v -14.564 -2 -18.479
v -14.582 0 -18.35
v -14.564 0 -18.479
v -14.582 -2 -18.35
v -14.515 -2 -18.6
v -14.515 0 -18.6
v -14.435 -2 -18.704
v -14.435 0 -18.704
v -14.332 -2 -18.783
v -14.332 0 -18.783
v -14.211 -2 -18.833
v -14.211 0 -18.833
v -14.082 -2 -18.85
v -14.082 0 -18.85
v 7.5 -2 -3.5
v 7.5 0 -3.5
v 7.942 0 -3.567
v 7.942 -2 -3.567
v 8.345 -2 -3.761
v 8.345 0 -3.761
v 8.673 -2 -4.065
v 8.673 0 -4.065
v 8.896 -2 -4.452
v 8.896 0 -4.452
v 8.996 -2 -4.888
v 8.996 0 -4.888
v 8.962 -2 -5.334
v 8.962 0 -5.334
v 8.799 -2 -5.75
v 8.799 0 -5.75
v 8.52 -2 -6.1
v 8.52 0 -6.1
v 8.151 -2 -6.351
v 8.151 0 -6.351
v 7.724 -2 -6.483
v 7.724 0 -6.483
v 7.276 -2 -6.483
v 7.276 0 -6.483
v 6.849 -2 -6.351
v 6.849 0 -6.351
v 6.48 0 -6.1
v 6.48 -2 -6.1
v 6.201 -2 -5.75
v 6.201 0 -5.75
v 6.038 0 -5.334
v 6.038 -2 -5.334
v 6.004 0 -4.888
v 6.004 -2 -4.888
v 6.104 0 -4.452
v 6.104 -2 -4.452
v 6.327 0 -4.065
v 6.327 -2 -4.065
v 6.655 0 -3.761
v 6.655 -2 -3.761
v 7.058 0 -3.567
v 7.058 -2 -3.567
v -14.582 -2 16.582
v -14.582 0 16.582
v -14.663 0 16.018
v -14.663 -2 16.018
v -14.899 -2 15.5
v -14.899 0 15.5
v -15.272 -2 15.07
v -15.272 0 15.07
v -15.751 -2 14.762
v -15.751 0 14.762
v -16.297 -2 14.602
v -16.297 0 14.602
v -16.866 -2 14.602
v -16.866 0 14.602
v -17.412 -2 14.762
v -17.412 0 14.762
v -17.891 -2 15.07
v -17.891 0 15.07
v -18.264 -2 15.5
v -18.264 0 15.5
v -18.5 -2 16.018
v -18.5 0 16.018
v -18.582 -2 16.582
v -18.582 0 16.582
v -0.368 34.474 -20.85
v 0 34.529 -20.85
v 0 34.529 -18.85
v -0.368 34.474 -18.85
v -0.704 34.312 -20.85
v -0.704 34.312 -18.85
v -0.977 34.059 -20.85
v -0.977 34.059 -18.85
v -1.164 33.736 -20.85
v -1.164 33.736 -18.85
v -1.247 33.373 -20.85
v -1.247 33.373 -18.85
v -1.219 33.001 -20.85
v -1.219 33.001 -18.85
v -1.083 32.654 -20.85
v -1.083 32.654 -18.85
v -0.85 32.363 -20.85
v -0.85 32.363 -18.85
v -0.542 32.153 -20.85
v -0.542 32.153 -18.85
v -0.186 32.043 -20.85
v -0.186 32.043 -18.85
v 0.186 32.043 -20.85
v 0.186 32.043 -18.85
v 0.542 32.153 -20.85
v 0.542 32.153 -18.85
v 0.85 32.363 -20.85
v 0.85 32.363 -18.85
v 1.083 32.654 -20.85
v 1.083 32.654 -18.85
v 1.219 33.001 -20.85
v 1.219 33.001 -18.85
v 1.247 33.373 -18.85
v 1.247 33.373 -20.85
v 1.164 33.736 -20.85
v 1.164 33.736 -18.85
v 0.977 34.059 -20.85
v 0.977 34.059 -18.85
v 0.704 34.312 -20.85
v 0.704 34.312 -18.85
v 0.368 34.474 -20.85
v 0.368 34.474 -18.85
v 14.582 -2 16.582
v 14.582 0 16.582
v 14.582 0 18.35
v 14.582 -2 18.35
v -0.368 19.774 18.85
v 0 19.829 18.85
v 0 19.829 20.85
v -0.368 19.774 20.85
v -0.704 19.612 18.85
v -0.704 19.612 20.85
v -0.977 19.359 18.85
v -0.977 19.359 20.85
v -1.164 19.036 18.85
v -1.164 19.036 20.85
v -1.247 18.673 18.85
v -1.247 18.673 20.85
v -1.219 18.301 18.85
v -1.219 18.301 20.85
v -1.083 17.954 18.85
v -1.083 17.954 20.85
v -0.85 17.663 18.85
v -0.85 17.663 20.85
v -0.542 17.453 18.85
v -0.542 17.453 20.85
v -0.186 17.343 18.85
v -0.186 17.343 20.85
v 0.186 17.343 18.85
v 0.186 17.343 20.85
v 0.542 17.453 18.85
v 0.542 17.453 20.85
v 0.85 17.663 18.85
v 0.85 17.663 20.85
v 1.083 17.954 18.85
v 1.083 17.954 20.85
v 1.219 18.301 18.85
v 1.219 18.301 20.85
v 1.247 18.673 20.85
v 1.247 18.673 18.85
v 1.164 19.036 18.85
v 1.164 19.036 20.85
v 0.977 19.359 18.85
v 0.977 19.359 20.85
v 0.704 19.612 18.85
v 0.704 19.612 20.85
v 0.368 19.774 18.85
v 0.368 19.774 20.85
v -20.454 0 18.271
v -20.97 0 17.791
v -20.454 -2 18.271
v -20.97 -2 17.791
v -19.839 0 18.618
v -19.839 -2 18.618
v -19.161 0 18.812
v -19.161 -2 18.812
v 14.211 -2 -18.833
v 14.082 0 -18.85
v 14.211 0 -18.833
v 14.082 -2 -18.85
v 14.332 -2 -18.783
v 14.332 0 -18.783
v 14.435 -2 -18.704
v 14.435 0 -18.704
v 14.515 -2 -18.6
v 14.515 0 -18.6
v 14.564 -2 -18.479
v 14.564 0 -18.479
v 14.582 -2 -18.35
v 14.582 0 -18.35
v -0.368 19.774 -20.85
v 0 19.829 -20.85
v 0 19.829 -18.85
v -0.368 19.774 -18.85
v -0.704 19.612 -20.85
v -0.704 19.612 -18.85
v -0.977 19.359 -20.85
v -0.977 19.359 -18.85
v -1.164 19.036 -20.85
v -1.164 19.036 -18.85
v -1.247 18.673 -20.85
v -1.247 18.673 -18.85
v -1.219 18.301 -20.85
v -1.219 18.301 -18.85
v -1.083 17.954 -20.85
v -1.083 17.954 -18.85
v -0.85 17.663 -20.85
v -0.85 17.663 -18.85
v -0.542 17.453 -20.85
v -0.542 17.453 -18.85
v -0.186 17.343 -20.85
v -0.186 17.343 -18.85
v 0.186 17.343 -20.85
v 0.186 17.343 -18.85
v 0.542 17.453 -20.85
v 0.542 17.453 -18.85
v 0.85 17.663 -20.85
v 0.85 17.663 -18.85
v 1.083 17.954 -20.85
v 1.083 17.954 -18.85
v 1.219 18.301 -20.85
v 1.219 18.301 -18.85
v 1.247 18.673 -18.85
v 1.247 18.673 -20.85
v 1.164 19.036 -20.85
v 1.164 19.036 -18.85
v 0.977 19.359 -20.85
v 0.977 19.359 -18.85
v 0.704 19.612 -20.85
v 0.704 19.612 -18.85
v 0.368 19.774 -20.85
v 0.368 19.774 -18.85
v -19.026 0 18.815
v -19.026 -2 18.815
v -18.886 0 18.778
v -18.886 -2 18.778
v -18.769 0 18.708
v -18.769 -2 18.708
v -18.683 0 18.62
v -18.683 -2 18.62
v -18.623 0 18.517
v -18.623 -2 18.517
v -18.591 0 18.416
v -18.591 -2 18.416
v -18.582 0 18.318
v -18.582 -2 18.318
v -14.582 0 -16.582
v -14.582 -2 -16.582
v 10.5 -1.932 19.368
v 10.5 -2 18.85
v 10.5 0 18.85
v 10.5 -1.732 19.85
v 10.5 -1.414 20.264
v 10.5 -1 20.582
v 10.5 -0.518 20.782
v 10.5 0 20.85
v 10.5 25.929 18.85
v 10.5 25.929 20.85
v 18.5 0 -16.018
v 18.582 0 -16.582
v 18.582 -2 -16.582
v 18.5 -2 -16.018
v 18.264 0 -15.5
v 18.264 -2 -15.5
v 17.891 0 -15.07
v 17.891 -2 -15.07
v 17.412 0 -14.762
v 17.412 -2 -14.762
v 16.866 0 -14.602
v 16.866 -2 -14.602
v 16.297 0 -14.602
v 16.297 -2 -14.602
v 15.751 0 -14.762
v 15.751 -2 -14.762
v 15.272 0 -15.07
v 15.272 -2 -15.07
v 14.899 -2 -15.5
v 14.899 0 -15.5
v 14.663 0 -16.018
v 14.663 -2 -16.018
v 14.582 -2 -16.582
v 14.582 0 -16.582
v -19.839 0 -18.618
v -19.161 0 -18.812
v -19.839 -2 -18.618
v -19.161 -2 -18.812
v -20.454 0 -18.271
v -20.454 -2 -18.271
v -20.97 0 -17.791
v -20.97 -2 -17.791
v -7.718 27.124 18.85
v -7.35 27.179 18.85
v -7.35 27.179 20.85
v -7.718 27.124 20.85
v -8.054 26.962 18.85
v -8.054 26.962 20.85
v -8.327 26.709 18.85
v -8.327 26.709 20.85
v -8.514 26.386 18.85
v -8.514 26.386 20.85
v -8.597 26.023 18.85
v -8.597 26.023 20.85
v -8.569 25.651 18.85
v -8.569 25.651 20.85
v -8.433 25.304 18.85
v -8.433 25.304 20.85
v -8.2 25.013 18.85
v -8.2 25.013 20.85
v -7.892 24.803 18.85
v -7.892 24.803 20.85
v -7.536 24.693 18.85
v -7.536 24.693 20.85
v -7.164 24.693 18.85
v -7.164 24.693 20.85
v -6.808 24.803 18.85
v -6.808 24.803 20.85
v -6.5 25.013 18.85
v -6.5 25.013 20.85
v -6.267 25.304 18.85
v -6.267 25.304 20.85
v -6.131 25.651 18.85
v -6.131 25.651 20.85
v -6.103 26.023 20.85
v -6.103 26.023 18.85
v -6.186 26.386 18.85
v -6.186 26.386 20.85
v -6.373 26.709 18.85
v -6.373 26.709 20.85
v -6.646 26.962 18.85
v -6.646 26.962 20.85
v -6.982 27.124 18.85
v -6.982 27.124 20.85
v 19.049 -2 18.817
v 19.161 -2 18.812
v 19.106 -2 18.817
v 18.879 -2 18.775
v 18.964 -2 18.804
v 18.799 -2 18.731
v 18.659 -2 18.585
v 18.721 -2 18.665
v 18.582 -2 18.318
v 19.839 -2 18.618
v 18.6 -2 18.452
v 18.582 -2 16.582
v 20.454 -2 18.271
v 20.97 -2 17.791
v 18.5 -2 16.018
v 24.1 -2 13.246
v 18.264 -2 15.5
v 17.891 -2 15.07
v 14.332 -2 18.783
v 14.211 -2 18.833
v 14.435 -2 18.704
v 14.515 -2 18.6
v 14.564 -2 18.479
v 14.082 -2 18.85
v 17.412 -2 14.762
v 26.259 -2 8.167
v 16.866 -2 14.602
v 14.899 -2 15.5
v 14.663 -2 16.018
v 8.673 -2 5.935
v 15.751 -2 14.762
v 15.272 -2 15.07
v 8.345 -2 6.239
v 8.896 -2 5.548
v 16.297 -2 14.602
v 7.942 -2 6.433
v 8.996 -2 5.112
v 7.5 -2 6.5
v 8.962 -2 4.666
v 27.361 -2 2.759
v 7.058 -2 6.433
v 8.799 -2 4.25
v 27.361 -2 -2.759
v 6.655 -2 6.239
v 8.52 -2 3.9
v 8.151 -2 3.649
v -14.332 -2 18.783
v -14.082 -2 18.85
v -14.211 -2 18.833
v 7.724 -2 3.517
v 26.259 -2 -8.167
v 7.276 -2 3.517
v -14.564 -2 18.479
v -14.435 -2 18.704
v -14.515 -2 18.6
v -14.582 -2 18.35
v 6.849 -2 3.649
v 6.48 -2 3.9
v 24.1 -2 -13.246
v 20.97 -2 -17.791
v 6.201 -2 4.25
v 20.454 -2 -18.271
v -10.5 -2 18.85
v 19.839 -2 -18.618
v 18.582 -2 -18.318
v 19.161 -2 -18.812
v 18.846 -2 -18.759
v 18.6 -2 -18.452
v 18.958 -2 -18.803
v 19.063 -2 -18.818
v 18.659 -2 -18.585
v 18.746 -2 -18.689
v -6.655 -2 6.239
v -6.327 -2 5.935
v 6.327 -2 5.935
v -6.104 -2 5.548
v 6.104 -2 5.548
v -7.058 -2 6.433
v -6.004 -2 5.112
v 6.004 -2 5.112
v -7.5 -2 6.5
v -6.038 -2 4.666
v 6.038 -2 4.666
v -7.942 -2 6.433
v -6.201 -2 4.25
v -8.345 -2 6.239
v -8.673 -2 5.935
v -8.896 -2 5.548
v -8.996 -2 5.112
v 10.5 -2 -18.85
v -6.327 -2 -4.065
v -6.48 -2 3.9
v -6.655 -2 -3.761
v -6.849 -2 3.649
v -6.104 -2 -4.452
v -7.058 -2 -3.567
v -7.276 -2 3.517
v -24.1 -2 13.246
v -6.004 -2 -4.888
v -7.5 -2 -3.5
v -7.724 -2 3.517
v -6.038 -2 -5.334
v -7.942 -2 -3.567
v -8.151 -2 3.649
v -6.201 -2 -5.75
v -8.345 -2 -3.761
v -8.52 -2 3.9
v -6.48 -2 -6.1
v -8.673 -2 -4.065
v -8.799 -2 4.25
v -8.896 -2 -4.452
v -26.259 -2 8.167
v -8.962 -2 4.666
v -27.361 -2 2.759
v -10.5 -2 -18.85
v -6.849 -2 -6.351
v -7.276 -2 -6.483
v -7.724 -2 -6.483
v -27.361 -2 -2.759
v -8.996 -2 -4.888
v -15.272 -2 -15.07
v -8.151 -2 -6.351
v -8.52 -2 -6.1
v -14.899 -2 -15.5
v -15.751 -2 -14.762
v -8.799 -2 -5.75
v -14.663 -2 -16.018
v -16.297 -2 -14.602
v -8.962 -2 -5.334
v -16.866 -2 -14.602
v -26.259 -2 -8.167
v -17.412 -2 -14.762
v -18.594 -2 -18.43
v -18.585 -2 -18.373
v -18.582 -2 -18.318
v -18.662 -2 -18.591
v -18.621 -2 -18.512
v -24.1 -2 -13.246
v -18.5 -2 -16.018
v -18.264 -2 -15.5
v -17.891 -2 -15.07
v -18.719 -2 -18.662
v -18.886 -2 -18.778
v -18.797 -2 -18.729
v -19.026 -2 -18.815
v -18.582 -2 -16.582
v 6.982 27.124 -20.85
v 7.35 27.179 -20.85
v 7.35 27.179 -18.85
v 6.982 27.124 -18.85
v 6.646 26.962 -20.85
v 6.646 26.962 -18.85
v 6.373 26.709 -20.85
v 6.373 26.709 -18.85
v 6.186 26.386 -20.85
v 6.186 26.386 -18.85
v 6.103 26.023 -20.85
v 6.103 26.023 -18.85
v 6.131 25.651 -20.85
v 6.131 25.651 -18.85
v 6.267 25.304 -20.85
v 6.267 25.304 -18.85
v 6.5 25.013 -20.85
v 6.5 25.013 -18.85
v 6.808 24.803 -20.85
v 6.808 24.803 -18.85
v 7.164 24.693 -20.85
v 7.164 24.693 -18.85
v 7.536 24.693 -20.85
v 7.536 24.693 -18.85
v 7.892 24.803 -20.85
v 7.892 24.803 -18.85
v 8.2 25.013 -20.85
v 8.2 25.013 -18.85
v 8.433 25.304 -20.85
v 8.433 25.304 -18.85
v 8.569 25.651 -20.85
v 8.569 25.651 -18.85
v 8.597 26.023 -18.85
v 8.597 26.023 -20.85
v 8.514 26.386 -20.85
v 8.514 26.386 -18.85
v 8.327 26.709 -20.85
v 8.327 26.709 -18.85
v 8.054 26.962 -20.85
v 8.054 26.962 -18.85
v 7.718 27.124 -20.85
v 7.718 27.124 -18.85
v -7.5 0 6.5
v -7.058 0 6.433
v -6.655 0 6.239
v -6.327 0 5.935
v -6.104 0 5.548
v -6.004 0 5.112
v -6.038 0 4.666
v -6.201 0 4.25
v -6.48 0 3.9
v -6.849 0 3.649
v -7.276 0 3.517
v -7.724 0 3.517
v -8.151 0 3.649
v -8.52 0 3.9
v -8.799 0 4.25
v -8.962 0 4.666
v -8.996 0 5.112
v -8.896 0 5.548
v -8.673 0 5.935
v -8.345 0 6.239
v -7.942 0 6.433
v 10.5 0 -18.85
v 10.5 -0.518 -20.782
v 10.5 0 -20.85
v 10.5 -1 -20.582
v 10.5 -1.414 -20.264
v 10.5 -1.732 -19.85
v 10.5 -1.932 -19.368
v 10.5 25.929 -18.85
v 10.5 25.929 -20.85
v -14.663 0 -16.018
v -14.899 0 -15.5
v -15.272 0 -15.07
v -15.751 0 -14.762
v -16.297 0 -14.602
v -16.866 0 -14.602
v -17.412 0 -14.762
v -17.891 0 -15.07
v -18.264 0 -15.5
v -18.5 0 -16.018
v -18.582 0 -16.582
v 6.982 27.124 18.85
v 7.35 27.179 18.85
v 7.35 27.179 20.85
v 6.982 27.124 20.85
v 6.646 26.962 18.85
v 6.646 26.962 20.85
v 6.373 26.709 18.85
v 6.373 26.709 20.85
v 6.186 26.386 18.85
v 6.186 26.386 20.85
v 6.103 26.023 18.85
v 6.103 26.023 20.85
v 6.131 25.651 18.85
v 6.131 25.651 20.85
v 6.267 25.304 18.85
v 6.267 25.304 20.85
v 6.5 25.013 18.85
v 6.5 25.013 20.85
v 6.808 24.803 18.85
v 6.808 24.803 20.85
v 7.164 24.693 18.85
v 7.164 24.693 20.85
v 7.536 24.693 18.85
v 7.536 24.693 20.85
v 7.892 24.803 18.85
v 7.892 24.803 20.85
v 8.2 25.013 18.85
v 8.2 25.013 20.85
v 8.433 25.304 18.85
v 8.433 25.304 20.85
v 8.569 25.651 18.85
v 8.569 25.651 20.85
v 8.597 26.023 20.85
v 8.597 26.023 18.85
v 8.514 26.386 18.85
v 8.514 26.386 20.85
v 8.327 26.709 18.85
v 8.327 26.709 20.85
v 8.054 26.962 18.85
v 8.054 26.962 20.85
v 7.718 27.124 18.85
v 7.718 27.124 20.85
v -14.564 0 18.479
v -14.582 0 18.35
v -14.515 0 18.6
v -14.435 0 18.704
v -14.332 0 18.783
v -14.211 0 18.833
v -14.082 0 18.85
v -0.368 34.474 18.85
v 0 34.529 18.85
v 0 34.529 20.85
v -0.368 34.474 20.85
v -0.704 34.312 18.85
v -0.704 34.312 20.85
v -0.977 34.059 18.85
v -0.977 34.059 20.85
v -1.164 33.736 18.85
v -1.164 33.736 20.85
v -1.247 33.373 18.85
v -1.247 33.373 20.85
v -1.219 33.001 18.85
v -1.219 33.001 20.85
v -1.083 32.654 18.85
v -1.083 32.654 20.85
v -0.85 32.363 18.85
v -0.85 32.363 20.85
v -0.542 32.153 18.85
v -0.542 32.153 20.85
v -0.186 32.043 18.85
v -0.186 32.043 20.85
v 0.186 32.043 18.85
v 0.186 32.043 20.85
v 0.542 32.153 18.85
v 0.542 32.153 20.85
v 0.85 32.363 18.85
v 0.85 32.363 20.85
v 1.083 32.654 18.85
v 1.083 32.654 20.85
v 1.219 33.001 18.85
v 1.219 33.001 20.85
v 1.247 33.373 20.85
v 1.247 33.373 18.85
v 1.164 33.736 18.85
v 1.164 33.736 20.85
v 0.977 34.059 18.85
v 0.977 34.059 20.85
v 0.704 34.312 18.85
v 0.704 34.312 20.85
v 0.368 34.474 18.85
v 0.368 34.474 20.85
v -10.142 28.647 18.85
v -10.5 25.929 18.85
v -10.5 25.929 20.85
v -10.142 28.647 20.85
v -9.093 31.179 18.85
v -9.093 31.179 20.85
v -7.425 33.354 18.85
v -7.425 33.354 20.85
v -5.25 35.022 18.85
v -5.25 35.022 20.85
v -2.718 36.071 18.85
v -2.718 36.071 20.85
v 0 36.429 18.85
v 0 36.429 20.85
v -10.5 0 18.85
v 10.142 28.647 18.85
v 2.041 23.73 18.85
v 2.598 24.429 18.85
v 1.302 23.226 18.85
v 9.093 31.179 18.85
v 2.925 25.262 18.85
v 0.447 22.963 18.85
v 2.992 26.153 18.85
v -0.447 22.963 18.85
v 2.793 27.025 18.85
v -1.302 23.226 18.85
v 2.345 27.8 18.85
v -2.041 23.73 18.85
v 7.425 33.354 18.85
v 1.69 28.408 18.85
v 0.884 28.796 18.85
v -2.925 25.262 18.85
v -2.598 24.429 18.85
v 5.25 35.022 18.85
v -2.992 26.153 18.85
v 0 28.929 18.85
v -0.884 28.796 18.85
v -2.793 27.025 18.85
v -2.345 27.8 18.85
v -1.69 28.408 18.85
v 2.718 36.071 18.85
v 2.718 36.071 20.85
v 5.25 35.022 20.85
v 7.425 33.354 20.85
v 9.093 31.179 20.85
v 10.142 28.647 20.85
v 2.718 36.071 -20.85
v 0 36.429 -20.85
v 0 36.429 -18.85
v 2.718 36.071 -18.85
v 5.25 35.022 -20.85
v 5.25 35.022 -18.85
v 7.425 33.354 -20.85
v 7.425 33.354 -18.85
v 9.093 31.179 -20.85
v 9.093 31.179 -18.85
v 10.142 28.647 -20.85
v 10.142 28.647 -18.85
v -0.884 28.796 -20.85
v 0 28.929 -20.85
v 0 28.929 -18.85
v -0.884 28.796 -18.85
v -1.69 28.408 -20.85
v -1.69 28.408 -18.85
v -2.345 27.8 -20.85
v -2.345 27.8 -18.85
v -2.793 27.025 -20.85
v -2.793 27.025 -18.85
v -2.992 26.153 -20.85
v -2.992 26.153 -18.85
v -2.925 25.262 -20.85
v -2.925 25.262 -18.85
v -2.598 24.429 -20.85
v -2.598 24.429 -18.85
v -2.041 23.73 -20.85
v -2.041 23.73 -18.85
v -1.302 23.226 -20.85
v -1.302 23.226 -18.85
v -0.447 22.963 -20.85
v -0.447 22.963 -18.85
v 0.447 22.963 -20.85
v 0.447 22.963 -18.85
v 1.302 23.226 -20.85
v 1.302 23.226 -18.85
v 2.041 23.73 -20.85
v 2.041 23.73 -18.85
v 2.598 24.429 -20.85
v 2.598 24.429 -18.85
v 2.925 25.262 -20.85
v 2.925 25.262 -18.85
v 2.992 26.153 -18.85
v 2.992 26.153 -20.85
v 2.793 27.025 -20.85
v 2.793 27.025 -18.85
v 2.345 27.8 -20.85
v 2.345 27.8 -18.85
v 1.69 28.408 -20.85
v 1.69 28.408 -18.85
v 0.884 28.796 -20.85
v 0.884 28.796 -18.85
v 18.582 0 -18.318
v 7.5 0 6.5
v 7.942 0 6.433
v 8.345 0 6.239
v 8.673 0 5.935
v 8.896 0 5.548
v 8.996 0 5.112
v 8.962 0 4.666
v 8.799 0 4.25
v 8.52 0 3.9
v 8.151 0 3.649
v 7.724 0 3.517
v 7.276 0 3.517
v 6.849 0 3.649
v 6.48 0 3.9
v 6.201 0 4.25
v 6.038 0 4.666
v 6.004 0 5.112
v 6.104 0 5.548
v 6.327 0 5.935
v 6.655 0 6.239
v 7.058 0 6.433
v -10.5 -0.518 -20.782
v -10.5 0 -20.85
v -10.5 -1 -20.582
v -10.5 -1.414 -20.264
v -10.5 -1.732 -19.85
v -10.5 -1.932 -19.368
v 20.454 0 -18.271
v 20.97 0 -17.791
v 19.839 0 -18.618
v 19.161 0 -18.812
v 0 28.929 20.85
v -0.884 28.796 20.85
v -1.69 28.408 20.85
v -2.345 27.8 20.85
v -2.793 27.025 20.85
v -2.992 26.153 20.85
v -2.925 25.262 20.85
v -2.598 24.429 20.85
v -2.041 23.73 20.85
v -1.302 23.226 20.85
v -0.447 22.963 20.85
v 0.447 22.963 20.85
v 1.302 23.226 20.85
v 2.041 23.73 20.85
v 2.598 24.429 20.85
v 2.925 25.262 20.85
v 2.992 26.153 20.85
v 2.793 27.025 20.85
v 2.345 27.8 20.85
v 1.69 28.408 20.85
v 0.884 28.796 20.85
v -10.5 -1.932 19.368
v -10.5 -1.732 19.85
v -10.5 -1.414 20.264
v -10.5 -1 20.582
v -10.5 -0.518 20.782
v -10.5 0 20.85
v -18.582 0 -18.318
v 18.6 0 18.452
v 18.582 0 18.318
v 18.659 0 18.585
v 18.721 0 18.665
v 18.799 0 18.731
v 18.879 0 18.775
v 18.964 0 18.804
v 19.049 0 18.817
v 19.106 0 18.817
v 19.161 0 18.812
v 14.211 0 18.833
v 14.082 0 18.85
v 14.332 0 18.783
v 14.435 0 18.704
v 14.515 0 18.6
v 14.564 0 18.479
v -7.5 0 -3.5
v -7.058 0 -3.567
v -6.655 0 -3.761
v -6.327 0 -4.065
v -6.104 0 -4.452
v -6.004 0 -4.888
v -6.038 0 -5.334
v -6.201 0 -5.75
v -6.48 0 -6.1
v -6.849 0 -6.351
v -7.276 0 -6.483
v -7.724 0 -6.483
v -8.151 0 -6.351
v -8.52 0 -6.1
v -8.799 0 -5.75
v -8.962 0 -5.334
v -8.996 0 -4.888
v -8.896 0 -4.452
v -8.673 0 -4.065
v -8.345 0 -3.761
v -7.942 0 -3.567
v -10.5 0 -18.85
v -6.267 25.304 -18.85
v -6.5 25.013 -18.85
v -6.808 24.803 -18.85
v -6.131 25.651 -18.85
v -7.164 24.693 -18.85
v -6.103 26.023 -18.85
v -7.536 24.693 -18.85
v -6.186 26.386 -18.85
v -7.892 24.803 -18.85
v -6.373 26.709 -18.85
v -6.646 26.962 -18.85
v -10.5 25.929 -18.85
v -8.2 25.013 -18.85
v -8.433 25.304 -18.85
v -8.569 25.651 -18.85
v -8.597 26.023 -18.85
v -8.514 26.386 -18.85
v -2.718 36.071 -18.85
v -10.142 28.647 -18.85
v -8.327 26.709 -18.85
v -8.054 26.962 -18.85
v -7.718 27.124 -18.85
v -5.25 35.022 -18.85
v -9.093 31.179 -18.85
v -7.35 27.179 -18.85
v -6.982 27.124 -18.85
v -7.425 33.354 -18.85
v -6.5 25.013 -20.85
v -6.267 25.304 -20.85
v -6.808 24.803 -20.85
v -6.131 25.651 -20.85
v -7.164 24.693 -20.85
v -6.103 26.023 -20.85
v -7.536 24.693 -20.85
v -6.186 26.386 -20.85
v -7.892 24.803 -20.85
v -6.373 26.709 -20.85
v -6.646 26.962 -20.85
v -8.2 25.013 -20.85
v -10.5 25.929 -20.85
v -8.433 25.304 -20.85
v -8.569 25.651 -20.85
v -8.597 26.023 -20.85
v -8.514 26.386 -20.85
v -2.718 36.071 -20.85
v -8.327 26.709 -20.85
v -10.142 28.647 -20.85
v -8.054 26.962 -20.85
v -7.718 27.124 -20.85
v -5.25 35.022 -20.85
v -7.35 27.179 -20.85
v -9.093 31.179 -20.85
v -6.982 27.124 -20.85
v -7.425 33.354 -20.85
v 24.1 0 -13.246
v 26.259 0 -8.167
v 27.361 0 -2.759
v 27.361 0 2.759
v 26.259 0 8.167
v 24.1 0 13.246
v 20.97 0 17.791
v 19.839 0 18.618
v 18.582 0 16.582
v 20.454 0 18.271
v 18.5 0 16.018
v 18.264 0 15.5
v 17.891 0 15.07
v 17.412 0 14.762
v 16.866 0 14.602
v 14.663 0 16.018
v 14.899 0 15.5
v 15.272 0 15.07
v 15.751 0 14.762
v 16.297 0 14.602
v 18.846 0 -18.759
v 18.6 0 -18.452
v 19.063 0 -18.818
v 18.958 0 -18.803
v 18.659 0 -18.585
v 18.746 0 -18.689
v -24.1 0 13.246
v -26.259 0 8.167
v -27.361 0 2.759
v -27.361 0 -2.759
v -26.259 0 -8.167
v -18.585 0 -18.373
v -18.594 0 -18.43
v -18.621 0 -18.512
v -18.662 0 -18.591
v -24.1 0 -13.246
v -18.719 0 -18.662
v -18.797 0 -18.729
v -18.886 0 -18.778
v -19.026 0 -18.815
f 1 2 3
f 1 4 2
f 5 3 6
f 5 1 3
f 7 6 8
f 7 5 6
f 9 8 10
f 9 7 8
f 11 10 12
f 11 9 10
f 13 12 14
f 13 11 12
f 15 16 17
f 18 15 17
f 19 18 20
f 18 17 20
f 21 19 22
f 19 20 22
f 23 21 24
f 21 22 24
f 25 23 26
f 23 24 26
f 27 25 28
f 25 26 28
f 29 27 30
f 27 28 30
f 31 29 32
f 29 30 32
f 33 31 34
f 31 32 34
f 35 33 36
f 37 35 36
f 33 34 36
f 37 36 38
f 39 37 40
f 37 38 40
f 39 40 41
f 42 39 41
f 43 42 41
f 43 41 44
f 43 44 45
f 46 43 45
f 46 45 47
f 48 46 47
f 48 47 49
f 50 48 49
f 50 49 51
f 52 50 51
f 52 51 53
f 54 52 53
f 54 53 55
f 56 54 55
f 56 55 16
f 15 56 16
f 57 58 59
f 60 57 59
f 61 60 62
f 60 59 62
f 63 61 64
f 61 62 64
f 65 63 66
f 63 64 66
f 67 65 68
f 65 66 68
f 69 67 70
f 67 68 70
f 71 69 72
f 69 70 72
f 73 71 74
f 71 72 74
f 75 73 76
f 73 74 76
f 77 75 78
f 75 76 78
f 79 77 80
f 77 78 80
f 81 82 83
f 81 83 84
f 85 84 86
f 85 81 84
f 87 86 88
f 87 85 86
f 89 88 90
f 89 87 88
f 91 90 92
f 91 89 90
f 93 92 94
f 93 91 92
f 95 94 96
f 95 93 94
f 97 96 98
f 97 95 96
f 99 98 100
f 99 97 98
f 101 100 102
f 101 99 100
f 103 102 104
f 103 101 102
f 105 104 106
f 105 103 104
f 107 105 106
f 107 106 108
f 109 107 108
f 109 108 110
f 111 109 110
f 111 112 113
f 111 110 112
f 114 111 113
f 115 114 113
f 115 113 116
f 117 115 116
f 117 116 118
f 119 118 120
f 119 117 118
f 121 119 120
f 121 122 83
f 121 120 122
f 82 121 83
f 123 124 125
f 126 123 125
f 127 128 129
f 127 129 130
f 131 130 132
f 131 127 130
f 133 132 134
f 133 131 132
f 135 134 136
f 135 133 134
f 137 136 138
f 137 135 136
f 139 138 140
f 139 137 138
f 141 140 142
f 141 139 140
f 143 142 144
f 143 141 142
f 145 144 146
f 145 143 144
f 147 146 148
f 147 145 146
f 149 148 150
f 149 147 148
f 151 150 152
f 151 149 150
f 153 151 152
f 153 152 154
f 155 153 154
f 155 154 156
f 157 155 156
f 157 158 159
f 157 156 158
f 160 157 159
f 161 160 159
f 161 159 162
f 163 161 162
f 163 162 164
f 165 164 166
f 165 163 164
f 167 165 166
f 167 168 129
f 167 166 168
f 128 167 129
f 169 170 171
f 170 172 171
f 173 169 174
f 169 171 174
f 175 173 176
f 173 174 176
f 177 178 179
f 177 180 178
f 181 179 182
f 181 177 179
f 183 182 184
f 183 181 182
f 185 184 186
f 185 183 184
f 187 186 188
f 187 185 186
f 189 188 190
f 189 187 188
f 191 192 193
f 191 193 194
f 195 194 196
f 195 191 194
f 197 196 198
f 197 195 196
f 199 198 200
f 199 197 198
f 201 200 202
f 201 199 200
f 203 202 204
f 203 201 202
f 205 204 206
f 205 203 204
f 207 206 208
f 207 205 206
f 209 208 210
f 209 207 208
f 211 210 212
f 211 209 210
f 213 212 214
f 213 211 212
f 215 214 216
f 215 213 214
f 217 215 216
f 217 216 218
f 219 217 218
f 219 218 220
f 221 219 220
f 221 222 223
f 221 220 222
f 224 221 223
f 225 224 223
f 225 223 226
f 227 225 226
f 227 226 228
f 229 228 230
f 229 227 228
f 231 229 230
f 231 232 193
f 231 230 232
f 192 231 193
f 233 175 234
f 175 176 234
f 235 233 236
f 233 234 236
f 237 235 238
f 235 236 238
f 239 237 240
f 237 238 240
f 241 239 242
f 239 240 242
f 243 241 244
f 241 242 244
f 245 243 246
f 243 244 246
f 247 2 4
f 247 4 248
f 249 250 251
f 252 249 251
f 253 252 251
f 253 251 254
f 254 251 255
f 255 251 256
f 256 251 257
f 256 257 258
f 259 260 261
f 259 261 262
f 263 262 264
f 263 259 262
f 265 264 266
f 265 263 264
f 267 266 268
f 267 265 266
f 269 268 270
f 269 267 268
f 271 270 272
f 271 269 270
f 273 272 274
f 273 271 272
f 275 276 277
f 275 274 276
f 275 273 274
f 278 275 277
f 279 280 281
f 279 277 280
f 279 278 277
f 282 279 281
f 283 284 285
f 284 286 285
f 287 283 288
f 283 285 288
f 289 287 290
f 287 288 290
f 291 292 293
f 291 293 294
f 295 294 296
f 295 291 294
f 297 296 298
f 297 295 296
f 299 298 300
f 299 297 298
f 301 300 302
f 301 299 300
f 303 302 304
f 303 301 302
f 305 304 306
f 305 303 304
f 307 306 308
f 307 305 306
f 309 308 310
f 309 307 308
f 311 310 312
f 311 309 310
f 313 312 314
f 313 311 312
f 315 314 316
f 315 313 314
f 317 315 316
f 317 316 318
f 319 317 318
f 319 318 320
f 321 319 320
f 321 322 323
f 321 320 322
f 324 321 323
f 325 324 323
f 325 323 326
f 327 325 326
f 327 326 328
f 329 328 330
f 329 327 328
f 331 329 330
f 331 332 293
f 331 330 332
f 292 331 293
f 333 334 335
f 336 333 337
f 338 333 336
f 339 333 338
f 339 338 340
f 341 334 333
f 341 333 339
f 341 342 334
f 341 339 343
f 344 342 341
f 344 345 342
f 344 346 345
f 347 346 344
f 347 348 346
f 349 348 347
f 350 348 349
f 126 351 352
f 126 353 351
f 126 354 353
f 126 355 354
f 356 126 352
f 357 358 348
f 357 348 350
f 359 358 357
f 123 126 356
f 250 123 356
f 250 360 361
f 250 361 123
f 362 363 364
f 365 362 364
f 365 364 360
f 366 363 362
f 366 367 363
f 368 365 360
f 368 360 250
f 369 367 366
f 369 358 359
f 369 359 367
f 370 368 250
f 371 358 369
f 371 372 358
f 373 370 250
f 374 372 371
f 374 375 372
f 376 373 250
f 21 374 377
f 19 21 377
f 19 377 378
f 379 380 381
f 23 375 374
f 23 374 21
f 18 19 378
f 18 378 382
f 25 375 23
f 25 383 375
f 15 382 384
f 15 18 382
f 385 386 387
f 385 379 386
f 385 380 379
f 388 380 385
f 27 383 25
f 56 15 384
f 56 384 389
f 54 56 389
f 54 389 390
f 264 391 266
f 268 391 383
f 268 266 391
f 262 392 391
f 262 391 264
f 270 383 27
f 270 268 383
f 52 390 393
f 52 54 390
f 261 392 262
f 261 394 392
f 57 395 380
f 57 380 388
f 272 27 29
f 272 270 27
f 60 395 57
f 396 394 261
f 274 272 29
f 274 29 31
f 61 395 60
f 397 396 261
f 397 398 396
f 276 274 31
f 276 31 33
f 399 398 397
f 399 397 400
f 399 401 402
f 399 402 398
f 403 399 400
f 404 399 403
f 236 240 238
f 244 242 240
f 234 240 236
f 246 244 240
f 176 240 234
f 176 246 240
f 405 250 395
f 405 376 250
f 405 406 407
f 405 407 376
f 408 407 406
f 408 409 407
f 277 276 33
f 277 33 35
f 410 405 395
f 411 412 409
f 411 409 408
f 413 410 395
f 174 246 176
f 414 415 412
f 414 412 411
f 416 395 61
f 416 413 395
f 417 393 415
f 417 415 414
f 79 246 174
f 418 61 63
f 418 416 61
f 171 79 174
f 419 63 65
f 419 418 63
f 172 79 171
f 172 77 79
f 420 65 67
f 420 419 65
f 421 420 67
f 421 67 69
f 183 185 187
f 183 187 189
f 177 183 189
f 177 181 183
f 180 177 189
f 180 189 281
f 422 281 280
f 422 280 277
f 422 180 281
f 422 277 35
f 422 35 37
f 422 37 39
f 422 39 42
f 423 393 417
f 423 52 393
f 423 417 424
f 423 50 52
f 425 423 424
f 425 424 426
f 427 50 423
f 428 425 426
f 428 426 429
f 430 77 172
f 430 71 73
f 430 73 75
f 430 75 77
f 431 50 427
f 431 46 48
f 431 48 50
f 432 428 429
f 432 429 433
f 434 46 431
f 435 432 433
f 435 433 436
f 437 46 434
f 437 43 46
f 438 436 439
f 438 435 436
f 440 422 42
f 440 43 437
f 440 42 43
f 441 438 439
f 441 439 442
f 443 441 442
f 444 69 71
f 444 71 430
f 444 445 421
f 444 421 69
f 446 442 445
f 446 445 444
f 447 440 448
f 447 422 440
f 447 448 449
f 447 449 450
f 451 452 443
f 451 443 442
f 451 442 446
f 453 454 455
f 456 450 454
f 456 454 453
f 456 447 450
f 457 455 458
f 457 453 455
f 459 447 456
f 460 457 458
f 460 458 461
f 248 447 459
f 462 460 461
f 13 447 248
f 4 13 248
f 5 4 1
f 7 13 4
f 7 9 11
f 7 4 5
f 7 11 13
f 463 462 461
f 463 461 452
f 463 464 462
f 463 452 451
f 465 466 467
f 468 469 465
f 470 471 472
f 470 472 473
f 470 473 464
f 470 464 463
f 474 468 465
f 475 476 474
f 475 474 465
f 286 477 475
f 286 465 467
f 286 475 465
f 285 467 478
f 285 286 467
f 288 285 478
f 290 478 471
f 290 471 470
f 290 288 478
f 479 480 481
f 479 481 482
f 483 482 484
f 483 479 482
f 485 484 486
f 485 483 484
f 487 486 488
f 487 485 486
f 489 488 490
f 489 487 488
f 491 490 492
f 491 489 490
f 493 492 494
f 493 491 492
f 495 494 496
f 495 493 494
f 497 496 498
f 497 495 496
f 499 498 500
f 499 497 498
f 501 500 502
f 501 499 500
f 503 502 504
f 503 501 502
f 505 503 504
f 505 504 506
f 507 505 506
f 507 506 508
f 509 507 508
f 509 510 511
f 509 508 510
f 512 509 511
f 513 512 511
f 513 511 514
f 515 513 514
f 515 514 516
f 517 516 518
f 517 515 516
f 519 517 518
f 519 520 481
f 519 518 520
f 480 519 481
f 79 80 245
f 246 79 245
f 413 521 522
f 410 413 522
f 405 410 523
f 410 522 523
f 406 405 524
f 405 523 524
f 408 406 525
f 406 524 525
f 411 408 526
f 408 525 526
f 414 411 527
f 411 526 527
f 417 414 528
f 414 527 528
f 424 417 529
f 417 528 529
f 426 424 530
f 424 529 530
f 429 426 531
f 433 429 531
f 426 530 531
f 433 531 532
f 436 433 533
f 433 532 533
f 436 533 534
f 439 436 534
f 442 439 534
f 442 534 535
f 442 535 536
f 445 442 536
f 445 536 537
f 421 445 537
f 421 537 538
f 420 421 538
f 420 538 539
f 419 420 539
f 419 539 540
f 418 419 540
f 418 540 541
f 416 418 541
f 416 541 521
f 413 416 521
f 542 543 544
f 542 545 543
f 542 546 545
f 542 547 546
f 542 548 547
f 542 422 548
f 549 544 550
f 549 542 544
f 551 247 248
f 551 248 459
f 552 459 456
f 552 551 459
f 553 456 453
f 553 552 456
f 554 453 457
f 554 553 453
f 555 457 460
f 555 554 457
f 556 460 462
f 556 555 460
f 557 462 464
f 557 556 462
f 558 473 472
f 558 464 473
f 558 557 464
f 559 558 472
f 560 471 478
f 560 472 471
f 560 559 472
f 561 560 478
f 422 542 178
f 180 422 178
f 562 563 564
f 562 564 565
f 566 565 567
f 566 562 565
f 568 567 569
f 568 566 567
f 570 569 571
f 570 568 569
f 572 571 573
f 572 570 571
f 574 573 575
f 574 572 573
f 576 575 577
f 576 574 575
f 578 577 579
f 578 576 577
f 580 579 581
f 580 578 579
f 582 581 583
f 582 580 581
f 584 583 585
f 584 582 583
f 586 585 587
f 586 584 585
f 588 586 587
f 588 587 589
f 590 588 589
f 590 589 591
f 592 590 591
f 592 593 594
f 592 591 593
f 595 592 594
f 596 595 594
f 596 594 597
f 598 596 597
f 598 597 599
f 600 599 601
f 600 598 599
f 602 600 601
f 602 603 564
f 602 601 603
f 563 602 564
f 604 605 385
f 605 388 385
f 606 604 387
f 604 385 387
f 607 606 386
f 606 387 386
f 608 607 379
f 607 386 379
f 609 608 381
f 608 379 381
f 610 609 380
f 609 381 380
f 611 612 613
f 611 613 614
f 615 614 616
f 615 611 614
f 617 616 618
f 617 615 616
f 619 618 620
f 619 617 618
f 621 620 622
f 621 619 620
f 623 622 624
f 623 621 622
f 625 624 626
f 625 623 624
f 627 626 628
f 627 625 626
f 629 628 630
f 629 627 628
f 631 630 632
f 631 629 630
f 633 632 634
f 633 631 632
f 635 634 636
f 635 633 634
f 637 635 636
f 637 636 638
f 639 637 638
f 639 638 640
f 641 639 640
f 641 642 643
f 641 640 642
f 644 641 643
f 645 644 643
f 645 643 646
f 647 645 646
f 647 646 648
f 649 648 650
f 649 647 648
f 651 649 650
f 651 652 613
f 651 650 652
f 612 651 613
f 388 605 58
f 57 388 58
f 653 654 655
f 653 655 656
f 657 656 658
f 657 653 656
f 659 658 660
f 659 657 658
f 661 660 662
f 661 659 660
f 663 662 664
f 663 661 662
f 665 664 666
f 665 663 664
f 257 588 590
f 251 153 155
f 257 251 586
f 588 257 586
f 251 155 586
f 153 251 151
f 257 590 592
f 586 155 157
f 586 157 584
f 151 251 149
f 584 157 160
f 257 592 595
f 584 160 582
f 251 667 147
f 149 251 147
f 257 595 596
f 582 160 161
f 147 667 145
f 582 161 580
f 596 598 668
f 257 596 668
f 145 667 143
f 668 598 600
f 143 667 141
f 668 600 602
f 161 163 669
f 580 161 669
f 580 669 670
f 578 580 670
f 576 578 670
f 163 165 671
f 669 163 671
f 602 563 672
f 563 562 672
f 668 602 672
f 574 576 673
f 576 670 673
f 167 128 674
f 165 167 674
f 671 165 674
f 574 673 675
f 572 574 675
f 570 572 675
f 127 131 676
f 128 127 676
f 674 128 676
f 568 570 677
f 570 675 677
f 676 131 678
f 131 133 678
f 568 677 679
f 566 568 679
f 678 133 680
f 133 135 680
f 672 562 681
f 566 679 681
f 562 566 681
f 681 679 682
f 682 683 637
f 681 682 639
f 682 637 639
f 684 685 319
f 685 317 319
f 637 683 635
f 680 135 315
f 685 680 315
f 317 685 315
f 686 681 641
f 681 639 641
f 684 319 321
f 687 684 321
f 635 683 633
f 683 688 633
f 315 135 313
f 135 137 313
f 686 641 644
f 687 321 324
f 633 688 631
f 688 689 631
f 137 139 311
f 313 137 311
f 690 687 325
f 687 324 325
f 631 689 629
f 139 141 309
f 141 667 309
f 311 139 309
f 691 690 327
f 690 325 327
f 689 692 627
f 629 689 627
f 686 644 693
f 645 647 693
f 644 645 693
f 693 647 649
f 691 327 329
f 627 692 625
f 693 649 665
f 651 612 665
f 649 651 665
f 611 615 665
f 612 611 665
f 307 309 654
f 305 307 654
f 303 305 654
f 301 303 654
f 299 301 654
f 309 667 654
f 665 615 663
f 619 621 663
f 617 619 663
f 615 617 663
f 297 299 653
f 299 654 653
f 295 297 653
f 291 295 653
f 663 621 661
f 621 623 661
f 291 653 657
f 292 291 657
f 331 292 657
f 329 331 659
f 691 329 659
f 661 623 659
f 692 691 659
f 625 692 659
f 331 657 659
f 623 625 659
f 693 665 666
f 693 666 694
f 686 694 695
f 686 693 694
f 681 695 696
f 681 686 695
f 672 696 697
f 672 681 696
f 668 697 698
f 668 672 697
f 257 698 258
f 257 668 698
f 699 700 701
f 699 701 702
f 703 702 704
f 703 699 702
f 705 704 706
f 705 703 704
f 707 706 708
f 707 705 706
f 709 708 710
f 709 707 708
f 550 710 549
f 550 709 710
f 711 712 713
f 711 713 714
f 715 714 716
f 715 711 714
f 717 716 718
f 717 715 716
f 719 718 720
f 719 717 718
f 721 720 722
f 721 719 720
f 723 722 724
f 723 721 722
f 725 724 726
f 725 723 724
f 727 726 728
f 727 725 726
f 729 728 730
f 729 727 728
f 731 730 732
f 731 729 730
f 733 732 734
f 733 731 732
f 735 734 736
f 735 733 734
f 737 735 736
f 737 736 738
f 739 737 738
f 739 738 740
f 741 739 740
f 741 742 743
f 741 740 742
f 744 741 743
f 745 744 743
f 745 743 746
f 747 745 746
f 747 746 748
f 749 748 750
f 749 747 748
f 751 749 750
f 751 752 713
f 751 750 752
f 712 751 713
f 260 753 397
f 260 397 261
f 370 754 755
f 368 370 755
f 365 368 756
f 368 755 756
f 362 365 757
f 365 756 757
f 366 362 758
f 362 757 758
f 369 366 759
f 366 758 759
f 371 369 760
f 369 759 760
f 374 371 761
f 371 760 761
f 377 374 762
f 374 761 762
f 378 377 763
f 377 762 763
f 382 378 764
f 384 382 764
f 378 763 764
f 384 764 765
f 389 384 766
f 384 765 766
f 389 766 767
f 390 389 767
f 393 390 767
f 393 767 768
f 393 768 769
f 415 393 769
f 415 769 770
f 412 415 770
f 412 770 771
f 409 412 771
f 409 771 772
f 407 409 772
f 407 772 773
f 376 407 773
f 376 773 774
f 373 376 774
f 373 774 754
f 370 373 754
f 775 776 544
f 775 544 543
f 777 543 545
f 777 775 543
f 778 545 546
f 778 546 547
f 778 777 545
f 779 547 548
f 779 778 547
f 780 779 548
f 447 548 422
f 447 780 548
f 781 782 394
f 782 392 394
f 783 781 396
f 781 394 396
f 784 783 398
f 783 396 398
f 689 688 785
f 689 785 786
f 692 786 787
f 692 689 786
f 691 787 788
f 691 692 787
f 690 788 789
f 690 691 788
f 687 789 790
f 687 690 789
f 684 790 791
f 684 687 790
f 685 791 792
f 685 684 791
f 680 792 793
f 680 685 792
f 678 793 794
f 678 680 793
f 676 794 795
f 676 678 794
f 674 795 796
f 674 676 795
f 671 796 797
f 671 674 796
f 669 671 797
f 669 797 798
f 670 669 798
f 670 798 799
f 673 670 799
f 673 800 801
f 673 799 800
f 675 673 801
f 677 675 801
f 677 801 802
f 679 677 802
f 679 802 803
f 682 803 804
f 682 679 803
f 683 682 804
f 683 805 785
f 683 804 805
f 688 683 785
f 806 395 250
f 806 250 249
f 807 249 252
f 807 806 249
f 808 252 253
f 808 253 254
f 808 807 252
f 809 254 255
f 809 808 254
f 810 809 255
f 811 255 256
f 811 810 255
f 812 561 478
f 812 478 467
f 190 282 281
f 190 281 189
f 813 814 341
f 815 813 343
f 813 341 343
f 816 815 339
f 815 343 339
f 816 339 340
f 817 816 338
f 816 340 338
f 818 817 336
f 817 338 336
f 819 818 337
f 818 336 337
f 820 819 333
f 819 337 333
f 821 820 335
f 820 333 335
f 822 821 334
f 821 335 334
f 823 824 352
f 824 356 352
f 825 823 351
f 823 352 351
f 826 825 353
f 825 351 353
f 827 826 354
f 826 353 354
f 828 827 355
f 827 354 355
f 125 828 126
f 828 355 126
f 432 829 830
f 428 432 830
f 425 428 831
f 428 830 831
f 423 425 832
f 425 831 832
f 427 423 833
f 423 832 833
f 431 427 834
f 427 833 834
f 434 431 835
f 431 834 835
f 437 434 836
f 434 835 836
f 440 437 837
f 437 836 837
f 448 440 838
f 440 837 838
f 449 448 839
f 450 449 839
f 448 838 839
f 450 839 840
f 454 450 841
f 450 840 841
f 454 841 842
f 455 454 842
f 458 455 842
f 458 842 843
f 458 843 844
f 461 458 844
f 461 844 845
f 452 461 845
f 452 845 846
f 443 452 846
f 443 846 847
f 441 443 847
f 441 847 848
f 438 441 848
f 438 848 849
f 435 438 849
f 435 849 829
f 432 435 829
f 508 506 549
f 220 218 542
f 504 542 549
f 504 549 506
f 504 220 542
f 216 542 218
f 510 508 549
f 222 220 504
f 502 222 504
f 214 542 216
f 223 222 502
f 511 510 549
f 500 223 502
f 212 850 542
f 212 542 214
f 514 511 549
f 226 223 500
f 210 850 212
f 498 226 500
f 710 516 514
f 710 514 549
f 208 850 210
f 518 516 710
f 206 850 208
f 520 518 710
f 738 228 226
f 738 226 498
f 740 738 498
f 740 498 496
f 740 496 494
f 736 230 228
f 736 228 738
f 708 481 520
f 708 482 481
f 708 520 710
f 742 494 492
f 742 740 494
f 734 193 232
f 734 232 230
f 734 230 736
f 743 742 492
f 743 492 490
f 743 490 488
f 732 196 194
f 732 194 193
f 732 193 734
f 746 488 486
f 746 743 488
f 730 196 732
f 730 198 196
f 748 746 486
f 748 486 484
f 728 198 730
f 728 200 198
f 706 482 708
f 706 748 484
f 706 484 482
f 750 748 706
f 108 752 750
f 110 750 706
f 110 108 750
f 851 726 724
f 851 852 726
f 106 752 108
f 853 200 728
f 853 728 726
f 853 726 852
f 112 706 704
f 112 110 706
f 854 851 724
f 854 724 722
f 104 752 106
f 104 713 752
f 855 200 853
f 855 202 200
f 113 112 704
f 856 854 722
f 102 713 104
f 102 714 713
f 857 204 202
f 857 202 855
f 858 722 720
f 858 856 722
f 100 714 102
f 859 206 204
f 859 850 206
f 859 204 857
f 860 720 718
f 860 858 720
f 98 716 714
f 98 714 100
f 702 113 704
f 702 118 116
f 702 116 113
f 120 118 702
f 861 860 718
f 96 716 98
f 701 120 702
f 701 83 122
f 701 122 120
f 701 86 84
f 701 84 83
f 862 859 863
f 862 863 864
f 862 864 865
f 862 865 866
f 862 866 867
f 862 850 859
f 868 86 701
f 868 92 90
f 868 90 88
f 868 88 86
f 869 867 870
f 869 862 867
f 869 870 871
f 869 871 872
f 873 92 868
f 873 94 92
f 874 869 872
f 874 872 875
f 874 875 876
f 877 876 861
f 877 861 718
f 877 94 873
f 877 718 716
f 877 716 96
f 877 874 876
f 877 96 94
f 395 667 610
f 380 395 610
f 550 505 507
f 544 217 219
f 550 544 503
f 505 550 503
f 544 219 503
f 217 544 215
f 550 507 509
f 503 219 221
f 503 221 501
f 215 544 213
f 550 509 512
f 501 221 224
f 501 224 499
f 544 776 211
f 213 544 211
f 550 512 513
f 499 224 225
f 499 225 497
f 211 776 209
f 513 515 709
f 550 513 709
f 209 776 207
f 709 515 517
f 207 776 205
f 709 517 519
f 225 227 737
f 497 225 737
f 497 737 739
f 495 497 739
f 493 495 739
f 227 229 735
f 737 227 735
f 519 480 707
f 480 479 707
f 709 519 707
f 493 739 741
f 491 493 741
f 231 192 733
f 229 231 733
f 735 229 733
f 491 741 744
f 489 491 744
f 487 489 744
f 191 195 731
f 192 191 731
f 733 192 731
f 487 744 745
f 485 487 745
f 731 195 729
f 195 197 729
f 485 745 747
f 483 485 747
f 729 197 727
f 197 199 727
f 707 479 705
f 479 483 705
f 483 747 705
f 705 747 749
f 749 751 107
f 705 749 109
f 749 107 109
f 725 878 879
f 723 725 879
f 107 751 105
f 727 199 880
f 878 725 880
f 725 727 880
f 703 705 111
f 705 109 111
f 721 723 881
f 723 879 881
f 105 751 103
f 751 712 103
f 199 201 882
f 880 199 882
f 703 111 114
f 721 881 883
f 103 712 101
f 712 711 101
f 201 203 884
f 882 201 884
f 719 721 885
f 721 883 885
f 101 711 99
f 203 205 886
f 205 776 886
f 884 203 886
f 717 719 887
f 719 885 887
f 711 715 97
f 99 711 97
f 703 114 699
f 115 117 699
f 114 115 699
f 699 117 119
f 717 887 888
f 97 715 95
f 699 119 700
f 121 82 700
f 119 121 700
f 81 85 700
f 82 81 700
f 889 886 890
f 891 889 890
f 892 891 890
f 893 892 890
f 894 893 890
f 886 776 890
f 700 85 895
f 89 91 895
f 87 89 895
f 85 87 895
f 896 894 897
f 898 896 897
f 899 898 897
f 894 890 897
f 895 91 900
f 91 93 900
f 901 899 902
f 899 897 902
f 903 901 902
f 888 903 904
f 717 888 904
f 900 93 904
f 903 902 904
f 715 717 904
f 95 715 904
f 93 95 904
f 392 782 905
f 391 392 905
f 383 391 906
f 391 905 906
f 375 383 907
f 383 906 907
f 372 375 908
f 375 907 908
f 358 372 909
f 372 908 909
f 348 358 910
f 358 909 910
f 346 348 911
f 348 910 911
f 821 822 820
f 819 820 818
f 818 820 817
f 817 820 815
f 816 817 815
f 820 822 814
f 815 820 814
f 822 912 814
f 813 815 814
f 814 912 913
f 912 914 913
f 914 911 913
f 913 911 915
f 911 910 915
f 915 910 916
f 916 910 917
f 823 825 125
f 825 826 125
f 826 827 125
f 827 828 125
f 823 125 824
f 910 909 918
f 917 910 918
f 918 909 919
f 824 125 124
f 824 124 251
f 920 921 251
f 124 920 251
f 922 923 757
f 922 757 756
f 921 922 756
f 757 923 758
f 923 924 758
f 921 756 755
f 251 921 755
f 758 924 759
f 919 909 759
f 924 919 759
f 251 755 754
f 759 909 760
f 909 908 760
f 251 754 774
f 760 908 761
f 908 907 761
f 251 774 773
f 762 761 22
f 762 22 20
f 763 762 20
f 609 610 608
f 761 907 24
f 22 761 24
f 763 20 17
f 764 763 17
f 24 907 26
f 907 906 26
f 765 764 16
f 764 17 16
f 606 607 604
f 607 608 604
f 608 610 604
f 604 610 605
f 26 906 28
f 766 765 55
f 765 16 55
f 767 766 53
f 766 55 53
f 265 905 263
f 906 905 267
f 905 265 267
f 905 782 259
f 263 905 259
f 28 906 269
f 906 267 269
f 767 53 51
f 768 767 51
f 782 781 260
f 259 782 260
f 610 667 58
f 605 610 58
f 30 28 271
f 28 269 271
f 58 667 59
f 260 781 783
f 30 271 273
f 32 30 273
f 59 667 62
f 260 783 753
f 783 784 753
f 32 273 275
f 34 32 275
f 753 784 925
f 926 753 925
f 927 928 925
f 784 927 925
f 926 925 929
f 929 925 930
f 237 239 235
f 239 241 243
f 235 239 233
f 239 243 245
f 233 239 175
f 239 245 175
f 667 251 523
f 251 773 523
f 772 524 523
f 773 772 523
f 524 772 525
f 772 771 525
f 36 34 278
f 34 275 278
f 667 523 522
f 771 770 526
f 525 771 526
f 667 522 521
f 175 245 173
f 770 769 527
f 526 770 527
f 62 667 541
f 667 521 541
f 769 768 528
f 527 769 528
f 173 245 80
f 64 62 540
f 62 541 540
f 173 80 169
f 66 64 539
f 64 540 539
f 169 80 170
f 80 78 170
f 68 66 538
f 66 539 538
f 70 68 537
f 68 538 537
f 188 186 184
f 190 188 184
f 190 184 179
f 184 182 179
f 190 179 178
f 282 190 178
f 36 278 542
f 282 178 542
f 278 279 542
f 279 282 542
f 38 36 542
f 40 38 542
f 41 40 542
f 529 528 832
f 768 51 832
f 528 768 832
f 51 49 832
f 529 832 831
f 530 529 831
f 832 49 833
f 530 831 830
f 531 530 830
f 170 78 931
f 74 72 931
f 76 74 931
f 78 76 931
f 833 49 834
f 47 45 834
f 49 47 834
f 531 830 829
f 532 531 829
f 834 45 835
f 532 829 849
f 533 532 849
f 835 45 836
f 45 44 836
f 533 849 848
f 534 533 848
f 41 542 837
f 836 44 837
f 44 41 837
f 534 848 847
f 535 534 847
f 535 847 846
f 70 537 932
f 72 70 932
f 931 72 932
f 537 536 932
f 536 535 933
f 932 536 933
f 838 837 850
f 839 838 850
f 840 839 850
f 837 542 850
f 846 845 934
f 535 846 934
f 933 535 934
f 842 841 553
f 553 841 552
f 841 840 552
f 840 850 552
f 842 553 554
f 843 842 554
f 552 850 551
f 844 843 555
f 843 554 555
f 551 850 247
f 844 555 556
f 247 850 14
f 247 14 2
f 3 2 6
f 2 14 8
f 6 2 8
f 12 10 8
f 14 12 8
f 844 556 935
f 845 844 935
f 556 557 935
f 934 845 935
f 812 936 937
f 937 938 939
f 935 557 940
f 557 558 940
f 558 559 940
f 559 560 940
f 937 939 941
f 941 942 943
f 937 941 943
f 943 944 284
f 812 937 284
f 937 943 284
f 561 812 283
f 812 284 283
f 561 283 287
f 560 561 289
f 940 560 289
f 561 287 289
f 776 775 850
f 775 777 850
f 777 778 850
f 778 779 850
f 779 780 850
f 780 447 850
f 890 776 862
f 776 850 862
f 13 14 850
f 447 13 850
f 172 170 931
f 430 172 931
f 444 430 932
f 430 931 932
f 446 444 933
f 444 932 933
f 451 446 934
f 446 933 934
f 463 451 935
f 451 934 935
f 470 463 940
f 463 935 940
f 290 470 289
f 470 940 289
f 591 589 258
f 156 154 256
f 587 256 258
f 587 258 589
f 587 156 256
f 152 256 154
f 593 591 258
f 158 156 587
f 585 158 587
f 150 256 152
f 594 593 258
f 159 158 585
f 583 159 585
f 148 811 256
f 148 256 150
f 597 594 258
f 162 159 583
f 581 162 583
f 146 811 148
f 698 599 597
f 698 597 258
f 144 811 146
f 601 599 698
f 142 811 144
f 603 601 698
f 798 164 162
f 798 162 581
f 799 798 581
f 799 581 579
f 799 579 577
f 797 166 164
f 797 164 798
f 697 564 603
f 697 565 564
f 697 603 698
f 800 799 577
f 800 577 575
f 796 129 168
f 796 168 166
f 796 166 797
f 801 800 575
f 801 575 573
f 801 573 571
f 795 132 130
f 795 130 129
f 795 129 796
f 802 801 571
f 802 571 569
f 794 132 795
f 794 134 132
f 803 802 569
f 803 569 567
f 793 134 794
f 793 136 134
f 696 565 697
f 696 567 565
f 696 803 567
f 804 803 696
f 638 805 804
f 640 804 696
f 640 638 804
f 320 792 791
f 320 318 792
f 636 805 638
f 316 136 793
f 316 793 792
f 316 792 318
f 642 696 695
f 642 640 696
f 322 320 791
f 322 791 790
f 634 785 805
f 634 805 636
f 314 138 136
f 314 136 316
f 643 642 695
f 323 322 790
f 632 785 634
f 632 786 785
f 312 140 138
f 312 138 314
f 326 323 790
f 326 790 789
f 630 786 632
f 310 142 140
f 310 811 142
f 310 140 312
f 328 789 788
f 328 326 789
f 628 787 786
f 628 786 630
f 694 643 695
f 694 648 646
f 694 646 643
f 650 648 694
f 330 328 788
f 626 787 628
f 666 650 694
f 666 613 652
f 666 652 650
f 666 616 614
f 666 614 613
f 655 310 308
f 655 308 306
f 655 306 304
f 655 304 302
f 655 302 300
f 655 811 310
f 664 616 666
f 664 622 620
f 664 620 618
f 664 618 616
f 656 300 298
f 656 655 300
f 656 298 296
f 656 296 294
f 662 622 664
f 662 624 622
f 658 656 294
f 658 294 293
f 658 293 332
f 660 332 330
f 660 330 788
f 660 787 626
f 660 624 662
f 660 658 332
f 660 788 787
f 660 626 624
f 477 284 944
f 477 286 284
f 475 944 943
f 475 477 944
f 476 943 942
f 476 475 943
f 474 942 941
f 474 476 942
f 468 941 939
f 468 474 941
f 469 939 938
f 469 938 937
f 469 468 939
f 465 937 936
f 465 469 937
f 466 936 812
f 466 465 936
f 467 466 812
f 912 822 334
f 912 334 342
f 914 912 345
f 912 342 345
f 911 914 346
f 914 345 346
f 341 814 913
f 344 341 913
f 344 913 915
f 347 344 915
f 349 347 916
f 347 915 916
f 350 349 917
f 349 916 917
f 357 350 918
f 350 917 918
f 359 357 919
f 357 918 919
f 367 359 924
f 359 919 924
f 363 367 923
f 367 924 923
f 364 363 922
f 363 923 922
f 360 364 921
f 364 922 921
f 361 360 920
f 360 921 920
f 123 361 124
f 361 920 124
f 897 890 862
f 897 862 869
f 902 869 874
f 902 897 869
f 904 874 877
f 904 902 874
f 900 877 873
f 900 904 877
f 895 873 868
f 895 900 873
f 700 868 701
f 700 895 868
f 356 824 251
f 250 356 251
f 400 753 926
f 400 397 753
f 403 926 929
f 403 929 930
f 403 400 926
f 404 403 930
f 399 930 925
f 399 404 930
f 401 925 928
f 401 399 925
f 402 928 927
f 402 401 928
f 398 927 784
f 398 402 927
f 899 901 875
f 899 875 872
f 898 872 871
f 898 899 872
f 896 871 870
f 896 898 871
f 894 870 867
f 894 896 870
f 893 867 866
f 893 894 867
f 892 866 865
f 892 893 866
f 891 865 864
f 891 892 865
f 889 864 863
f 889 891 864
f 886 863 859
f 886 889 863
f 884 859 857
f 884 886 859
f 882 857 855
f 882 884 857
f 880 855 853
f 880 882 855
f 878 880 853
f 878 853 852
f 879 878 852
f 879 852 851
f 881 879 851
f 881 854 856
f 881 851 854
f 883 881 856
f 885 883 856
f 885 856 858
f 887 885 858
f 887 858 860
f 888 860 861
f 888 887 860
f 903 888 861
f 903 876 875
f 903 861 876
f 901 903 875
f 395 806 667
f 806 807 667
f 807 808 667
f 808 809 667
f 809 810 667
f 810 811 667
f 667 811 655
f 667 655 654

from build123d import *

# Parameters (mm, degrees)
BRIDA_BASE1_DEPTH               = 2
PLIEGUE_START                   = -10.5
PLIEGUE_CROQUIZADO2_DEPTH       = 21
PLIEGUE_CROQUIZADO2_2_OUTLINE_W = 36.429203673
PLIEGUE_CROQUIZADO2_2_OUTLINE_H = 2
PLIEGUE_CROQUIZADO2_2_DEPTH     = 21
CROQUIS9_R                      = 1.5
CORTAR_EXTRUIR1_DEPTH           = 51.180268834
CORTAR_EXTRUIR2_DEPTH           = 62.824160975
CORTAR_EXTRUIR2_DEPTH_BACK      = 62.824160975
CROQUIS10_R                     = 1.25
CROQUIS10_R_2                   = 3
REDONDEO3_R                     = 3
REDONDEO4_R                     = 0.5


# Read off the part's stored shape, not the designer's step: Pliegue croquizado2
# Sheet-metal steps are written as plain solids
with BuildPart() as part:
    # Croquis1 → Brida base1 (new body)
    with BuildSketch(Plane(origin=(0, 0, 0), x_dir=(1, 0, 0), z_dir=(0, 1, 0))):
        with BuildLine():
            Line((10.5, 18.85), (20.023174074, 18.85))
            ThreePointArc((20.023174074, 18.85), (27.5, 0), (20.023174074, -18.85))
            Line((20.023174074, -18.85), (10.5, -18.85))
            Line((10.5, -18.85), (10.5, -56.85))
            Line((10.5, -56.85), (-10.5, -56.85))
            Line((-10.5, -56.85), (-10.5, -18.85))
            Line((-10.5, -18.85), (-20.023174074, -18.85))
            ThreePointArc((-20.023174074, -18.85), (-27.5, 0), (-20.023174074, 18.85))
            Line((-20.023174074, 18.85), (-10.5, 18.85))
            Line((-10.5, 18.85), (-10.5, 56.85))
            Line((-10.5, 56.85), (10.5, 56.85))
            Line((10.5, 56.85), (10.5, 18.85))
        make_face()
    extrude(amount=-BRIDA_BASE1_DEPTH)

    # Pliegue croquizado2 outline → Pliegue croquizado2 (cut)
    with BuildSketch(Plane.YZ.offset(PLIEGUE_START)):
        with BuildLine():
            Line((0, -56.85), (0, -20.85))
            ThreePointArc((0, -20.85), (-1.414213562, -20.264213562), (-2, -18.85))
            Line((-2, -18.85), (-2, -56.85))
            Line((-2, -56.85), (0, -56.85))
        make_face()
        with BuildLine():
            Line((-2, 56.85), (-2, 18.85))
            ThreePointArc((-2, 18.85), (-1.414213562, 20.264213562), (0, 20.85))
            Line((0, 20.85), (0, 56.85))
            Line((0, 56.85), (-2, 56.85))
        make_face()
    extrude(amount=PLIEGUE_CROQUIZADO2_DEPTH, mode=Mode.SUBTRACT)

    # Pliegue croquizado2 2 outline → Pliegue croquizado2 2 (add)
    with BuildSketch(Plane.YZ.offset(PLIEGUE_START)):
        with Locations((18.214601837, -19.85)):
            Rectangle(PLIEGUE_CROQUIZADO2_2_OUTLINE_W, PLIEGUE_CROQUIZADO2_2_OUTLINE_H)
        with Locations((18.214601837, 19.85)):
            Rectangle(PLIEGUE_CROQUIZADO2_2_OUTLINE_W, PLIEGUE_CROQUIZADO2_2_OUTLINE_H)
    extrude(amount=PLIEGUE_CROQUIZADO2_2_DEPTH)

    # Croquis9 → Cortar-Extruir1 (cut, through all)
    with BuildSketch(Plane(origin=(0, 0, 0), x_dir=(1, 0, 0), z_dir=(0, 1, 0))):
        with Locations(Location((-7.5, 5, 0), (0, 0, 270))):
            Circle(CROQUIS9_R)
        with Locations(Location((-7.5, -5, 0), (0, 0, 270))):
            Circle(CROQUIS9_R)
        with Locations(Location((7.5, -5, 0), (0, 0, 270))):
            Circle(CROQUIS9_R)
        with Locations(Location((7.5, 5, 0), (0, 0, 270))):
            Circle(CROQUIS9_R)
        with BuildLine():
            Line((-18.5815, 16.5815), (-18.5815, 18.85))
            Line((-18.5815, 18.85), (-14.5815, 18.85))
            Line((-14.5815, 18.85), (-14.5815, 16.5815))
            ThreePointArc((-14.5815, 16.5815), (-16.5815, 14.5815), (-18.5815, 16.5815))
        make_face()
        with BuildLine():
            Line((14.5815, 18.85), (18.5815, 18.85))
            Line((18.5815, 18.85), (18.5815, 16.5815))
            ThreePointArc((18.5815, 16.5815), (16.5815, 14.5815), (14.5815, 16.5815))
            Line((14.5815, 16.5815), (14.5815, 18.85))
        make_face()
        with BuildLine():
            Line((14.5815, -18.85), (18.5815, -18.85))
            Line((18.5815, -18.85), (18.5815, -16.5815))
            ThreePointArc((18.5815, -16.5815), (16.5815, -14.5815), (14.5815, -16.5815))
            Line((14.5815, -16.5815), (14.5815, -18.85))
        make_face()
        with BuildLine():
            Line((-18.5815, -16.5815), (-18.5815, -18.85))
            Line((-18.5815, -18.85), (-14.5815, -18.85))
            Line((-14.5815, -18.85), (-14.5815, -16.5815))
            ThreePointArc((-14.5815, -16.5815), (-16.5815, -14.5815), (-18.5815, -16.5815))
        make_face()
    extrude(amount=-CORTAR_EXTRUIR1_DEPTH, mode=Mode.SUBTRACT)

    # Croquis10 → Cortar-Extruir2 (cut, two sides: drawn at the far end of the back side and taken through both)
    with BuildSketch(Plane.XY.offset(20.85).offset(-CORTAR_EXTRUIR2_DEPTH_BACK)):
        with BuildLine():
            ThreePointArc((-10.5, 25.929203673), (-7.424621199, 33.353824879), (8e-09, 36.429203673))
            Line((8e-09, 36.429203673), (-10.5, 36.429203673))
            Line((-10.5, 36.429203673), (-10.5, 25.929203673))
        make_face()
        with BuildLine():
            ThreePointArc((8e-09, 36.429203673), (7.424621205, 33.353824873), (10.5, 25.929203673))
            Line((10.5, 25.929203673), (10.5, 36.429203673))
            Line((10.5, 36.429203673), (8e-09, 36.429203673))
        make_face()
        with Locations(Location((0, 18.579203673, 0), (0, 0, 90))):
            Circle(CROQUIS10_R)
        with Locations(Location((0, 25.929203673, 0), (0, 0, 90))):
            Circle(CROQUIS10_R_2)
        with Locations(Location((7.35, 25.929203673, 0), (0, 0, 90))):
            Circle(CROQUIS10_R)
        with Locations(Location((0, 33.279203673, 0), (0, 0, 90))):
            Circle(CROQUIS10_R)
        with Locations(Location((-7.35, 25.929203673, 0), (0, 0, 90))):
            Circle(CROQUIS10_R)
    extrude(amount=CORTAR_EXTRUIR2_DEPTH + CORTAR_EXTRUIR2_DEPTH_BACK, mode=Mode.SUBTRACT)

    # Redondeo3
    redondeo3_edges = [part.edges().sort_by_distance(p)[0] for p in [
        (20.023174074, -1, -18.85),
        (20.023174074, -1, 18.85),
        (-20.023174074, -1, 18.85),
        (-20.023174074, -1, -18.85),
    ]]
    fillet(redondeo3_edges, radius=REDONDEO3_R)

    # Redondeo4
    redondeo4_edges = [part.edges().sort_by_distance(p)[0] for p in [
        (18.5815, -1, 18.85),
        (14.5815, -1, 18.85),
        (18.5815, -1, -18.85),
        (14.5815, -1, -18.85),
        (-18.5815, -1, 18.85),
        (-14.5815, -1, 18.85),
        (-18.5815, -1, -18.85),
        (-14.5815, -1, -18.85),
    ]]
    fillet(redondeo4_edges, radius=REDONDEO4_R)


solid = part.part
